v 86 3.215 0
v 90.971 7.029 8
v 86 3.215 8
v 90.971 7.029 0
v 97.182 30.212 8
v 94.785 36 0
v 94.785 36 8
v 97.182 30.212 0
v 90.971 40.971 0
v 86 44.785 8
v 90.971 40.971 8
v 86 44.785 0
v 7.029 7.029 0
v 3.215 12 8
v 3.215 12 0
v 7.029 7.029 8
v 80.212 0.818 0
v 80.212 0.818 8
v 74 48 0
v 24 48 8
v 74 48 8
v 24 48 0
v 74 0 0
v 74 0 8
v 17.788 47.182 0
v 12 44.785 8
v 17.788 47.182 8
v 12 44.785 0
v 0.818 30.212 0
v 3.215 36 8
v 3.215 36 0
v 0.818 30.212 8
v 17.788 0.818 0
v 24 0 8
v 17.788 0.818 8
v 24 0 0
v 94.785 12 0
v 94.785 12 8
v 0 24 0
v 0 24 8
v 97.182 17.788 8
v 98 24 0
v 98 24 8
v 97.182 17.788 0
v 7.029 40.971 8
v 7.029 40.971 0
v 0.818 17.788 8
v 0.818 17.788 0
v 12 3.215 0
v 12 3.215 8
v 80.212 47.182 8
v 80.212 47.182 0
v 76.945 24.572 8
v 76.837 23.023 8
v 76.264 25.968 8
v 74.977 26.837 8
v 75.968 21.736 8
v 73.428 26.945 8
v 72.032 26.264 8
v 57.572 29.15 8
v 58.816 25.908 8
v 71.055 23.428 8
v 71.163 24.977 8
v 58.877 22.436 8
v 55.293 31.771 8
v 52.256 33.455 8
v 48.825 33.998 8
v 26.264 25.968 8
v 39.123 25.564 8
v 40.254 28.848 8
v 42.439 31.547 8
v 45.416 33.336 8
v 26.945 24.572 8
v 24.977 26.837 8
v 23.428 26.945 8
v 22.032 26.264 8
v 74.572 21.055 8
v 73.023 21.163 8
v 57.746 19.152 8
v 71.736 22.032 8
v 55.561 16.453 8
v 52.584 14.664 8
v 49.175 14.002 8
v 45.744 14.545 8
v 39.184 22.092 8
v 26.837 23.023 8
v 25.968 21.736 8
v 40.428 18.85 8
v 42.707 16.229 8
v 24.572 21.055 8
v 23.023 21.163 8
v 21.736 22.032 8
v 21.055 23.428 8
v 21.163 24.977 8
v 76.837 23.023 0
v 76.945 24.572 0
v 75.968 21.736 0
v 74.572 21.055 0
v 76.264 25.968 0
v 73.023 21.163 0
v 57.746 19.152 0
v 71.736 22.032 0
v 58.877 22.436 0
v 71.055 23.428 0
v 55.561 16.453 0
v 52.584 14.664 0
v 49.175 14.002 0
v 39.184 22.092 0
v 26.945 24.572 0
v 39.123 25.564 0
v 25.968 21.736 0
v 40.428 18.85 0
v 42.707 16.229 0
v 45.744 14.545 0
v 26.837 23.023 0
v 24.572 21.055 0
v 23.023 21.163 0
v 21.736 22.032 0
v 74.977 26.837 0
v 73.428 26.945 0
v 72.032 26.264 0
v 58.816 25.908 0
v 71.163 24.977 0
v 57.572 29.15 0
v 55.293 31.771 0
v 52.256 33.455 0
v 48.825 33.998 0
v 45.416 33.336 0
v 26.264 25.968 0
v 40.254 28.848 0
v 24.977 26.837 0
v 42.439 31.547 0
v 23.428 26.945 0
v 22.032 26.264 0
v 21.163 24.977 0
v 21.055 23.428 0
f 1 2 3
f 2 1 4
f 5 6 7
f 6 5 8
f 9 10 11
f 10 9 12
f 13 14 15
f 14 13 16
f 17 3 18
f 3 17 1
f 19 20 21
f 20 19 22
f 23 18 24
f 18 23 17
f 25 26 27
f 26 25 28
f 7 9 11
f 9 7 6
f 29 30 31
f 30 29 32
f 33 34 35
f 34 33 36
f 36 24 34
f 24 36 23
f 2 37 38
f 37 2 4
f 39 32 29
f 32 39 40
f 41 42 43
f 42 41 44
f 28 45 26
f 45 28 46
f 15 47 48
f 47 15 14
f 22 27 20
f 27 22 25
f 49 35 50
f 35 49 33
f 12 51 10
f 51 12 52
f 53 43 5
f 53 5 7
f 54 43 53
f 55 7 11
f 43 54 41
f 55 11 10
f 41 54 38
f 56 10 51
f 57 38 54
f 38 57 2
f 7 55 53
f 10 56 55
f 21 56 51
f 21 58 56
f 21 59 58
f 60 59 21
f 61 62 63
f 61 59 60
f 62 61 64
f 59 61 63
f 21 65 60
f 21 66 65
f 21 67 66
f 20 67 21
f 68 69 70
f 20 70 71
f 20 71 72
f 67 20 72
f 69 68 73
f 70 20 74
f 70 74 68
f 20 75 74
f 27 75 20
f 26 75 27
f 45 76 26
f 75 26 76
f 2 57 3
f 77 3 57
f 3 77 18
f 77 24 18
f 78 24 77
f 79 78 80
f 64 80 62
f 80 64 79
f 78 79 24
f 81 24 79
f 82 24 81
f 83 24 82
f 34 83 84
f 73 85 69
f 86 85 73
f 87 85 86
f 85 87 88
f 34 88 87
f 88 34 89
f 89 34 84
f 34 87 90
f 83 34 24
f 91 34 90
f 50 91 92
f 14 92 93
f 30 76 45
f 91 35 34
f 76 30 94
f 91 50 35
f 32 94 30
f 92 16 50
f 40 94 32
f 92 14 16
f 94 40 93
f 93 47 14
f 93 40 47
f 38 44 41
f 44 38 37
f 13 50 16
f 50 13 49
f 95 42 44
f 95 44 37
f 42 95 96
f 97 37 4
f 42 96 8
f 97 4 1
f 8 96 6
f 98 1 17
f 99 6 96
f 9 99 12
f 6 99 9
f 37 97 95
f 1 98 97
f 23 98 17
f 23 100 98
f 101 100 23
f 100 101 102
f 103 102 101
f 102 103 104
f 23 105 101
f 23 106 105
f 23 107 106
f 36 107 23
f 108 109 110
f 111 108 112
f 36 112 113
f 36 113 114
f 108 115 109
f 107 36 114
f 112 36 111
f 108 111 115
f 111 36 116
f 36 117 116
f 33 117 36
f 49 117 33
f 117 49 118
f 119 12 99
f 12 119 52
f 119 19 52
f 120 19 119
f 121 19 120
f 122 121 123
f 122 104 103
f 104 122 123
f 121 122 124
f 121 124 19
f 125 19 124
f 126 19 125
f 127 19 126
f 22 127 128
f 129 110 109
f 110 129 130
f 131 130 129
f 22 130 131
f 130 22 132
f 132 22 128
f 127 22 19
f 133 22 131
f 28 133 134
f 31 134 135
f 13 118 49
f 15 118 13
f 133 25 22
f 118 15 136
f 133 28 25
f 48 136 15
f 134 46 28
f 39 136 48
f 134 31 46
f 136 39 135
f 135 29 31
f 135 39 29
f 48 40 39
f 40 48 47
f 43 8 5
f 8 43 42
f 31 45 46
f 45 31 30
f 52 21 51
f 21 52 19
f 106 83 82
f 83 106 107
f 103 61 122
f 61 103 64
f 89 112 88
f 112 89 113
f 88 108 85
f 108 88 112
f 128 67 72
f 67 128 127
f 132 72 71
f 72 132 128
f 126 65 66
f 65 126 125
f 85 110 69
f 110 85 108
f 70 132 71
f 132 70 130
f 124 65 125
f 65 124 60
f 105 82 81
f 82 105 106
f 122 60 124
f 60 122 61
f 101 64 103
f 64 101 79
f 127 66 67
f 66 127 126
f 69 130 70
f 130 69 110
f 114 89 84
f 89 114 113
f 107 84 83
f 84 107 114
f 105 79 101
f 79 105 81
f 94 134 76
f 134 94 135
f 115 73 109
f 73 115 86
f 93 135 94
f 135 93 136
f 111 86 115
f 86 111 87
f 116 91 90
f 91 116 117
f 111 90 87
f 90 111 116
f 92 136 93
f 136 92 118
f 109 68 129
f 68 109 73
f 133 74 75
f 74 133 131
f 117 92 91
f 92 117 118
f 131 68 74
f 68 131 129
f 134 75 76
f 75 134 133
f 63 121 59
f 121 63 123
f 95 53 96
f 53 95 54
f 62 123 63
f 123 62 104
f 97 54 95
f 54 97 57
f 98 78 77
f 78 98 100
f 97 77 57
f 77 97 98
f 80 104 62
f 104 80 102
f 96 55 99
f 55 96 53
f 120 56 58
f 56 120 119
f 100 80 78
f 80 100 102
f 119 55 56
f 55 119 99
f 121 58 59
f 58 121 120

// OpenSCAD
$fn = 32;

// ----------------------------------------------------------------------
// Spacer plate: obround span 50, caps R24
// ----------------------------------------------------------------------

// --- parameters (mm) ---
bore_r = 10;              // centre bore radius
bolt_r = 3;               // bolt hole radius
plate_t = 8;              // plate thickness, Z (extrusion height)
span = 50;                // obround span
cap_r = 24;               // cap radius

profile = [[24, 48], [17.788, 47.182], [12, 44.785], [7.029, 40.971], [3.215, 36], [0.818, 30.212], [0, 24], [0.818, 17.788], [3.215, 12], [7.029, 7.029], [12, 3.215], [17.788, 0.818], [24, 0], [74, 0], [80.212, 0.818], [86, 3.215], [90.971, 7.029], [94.785, 12], [97.182, 17.788], [98, 24], [97.182, 30.212], [94.785, 36], [90.971, 40.971], [86, 44.785], [80.212, 47.182], [74, 48]];  // primary outline, 26 points, counter clockwise
void_1 = [[58.816, 25.908], [57.572, 29.15], [55.293, 31.771], [52.256, 33.455], [48.825, 33.998], [45.416, 33.336], [42.439, 31.547], [40.254, 28.848], [39.123, 25.564], [39.184, 22.092], [40.428, 18.85], [42.707, 16.229], [45.744, 14.545], [49.175, 14.002], [52.584, 14.664], [55.561, 16.453], [57.746, 19.152], [58.877, 22.436]];  // centre bore, 18 points
void_2 = [[26.945, 24.572], [26.264, 25.968], [24.977, 26.837], [23.428, 26.945], [22.032, 26.264], [21.163, 24.977], [21.055, 23.428], [21.736, 22.032], [23.023, 21.163], [24.572, 21.055], [25.968, 21.736], [26.837, 23.023]];  // end hole, 12 points
void_3 = [[76.945, 24.572], [76.264, 25.968], [74.977, 26.837], [73.428, 26.945], [72.032, 26.264], [71.163, 24.977], [71.055, 23.428], [71.736, 22.032], [73.023, 21.163], [74.572, 21.055], [75.968, 21.736], [76.837, 23.023]];  // end hole, 12 points

// --- the one profile operation ---
difference() {
  linear_extrude(height = plate_t) polygon(points = profile);
  translate([0, 0, -1])
    linear_extrude(height = plate_t + 2) polygon(points = void_1);
  translate([0, 0, -1])
    linear_extrude(height = plate_t + 2) polygon(points = void_2);
  translate([0, 0, -1])
    linear_extrude(height = plate_t + 2) polygon(points = void_3);
}
